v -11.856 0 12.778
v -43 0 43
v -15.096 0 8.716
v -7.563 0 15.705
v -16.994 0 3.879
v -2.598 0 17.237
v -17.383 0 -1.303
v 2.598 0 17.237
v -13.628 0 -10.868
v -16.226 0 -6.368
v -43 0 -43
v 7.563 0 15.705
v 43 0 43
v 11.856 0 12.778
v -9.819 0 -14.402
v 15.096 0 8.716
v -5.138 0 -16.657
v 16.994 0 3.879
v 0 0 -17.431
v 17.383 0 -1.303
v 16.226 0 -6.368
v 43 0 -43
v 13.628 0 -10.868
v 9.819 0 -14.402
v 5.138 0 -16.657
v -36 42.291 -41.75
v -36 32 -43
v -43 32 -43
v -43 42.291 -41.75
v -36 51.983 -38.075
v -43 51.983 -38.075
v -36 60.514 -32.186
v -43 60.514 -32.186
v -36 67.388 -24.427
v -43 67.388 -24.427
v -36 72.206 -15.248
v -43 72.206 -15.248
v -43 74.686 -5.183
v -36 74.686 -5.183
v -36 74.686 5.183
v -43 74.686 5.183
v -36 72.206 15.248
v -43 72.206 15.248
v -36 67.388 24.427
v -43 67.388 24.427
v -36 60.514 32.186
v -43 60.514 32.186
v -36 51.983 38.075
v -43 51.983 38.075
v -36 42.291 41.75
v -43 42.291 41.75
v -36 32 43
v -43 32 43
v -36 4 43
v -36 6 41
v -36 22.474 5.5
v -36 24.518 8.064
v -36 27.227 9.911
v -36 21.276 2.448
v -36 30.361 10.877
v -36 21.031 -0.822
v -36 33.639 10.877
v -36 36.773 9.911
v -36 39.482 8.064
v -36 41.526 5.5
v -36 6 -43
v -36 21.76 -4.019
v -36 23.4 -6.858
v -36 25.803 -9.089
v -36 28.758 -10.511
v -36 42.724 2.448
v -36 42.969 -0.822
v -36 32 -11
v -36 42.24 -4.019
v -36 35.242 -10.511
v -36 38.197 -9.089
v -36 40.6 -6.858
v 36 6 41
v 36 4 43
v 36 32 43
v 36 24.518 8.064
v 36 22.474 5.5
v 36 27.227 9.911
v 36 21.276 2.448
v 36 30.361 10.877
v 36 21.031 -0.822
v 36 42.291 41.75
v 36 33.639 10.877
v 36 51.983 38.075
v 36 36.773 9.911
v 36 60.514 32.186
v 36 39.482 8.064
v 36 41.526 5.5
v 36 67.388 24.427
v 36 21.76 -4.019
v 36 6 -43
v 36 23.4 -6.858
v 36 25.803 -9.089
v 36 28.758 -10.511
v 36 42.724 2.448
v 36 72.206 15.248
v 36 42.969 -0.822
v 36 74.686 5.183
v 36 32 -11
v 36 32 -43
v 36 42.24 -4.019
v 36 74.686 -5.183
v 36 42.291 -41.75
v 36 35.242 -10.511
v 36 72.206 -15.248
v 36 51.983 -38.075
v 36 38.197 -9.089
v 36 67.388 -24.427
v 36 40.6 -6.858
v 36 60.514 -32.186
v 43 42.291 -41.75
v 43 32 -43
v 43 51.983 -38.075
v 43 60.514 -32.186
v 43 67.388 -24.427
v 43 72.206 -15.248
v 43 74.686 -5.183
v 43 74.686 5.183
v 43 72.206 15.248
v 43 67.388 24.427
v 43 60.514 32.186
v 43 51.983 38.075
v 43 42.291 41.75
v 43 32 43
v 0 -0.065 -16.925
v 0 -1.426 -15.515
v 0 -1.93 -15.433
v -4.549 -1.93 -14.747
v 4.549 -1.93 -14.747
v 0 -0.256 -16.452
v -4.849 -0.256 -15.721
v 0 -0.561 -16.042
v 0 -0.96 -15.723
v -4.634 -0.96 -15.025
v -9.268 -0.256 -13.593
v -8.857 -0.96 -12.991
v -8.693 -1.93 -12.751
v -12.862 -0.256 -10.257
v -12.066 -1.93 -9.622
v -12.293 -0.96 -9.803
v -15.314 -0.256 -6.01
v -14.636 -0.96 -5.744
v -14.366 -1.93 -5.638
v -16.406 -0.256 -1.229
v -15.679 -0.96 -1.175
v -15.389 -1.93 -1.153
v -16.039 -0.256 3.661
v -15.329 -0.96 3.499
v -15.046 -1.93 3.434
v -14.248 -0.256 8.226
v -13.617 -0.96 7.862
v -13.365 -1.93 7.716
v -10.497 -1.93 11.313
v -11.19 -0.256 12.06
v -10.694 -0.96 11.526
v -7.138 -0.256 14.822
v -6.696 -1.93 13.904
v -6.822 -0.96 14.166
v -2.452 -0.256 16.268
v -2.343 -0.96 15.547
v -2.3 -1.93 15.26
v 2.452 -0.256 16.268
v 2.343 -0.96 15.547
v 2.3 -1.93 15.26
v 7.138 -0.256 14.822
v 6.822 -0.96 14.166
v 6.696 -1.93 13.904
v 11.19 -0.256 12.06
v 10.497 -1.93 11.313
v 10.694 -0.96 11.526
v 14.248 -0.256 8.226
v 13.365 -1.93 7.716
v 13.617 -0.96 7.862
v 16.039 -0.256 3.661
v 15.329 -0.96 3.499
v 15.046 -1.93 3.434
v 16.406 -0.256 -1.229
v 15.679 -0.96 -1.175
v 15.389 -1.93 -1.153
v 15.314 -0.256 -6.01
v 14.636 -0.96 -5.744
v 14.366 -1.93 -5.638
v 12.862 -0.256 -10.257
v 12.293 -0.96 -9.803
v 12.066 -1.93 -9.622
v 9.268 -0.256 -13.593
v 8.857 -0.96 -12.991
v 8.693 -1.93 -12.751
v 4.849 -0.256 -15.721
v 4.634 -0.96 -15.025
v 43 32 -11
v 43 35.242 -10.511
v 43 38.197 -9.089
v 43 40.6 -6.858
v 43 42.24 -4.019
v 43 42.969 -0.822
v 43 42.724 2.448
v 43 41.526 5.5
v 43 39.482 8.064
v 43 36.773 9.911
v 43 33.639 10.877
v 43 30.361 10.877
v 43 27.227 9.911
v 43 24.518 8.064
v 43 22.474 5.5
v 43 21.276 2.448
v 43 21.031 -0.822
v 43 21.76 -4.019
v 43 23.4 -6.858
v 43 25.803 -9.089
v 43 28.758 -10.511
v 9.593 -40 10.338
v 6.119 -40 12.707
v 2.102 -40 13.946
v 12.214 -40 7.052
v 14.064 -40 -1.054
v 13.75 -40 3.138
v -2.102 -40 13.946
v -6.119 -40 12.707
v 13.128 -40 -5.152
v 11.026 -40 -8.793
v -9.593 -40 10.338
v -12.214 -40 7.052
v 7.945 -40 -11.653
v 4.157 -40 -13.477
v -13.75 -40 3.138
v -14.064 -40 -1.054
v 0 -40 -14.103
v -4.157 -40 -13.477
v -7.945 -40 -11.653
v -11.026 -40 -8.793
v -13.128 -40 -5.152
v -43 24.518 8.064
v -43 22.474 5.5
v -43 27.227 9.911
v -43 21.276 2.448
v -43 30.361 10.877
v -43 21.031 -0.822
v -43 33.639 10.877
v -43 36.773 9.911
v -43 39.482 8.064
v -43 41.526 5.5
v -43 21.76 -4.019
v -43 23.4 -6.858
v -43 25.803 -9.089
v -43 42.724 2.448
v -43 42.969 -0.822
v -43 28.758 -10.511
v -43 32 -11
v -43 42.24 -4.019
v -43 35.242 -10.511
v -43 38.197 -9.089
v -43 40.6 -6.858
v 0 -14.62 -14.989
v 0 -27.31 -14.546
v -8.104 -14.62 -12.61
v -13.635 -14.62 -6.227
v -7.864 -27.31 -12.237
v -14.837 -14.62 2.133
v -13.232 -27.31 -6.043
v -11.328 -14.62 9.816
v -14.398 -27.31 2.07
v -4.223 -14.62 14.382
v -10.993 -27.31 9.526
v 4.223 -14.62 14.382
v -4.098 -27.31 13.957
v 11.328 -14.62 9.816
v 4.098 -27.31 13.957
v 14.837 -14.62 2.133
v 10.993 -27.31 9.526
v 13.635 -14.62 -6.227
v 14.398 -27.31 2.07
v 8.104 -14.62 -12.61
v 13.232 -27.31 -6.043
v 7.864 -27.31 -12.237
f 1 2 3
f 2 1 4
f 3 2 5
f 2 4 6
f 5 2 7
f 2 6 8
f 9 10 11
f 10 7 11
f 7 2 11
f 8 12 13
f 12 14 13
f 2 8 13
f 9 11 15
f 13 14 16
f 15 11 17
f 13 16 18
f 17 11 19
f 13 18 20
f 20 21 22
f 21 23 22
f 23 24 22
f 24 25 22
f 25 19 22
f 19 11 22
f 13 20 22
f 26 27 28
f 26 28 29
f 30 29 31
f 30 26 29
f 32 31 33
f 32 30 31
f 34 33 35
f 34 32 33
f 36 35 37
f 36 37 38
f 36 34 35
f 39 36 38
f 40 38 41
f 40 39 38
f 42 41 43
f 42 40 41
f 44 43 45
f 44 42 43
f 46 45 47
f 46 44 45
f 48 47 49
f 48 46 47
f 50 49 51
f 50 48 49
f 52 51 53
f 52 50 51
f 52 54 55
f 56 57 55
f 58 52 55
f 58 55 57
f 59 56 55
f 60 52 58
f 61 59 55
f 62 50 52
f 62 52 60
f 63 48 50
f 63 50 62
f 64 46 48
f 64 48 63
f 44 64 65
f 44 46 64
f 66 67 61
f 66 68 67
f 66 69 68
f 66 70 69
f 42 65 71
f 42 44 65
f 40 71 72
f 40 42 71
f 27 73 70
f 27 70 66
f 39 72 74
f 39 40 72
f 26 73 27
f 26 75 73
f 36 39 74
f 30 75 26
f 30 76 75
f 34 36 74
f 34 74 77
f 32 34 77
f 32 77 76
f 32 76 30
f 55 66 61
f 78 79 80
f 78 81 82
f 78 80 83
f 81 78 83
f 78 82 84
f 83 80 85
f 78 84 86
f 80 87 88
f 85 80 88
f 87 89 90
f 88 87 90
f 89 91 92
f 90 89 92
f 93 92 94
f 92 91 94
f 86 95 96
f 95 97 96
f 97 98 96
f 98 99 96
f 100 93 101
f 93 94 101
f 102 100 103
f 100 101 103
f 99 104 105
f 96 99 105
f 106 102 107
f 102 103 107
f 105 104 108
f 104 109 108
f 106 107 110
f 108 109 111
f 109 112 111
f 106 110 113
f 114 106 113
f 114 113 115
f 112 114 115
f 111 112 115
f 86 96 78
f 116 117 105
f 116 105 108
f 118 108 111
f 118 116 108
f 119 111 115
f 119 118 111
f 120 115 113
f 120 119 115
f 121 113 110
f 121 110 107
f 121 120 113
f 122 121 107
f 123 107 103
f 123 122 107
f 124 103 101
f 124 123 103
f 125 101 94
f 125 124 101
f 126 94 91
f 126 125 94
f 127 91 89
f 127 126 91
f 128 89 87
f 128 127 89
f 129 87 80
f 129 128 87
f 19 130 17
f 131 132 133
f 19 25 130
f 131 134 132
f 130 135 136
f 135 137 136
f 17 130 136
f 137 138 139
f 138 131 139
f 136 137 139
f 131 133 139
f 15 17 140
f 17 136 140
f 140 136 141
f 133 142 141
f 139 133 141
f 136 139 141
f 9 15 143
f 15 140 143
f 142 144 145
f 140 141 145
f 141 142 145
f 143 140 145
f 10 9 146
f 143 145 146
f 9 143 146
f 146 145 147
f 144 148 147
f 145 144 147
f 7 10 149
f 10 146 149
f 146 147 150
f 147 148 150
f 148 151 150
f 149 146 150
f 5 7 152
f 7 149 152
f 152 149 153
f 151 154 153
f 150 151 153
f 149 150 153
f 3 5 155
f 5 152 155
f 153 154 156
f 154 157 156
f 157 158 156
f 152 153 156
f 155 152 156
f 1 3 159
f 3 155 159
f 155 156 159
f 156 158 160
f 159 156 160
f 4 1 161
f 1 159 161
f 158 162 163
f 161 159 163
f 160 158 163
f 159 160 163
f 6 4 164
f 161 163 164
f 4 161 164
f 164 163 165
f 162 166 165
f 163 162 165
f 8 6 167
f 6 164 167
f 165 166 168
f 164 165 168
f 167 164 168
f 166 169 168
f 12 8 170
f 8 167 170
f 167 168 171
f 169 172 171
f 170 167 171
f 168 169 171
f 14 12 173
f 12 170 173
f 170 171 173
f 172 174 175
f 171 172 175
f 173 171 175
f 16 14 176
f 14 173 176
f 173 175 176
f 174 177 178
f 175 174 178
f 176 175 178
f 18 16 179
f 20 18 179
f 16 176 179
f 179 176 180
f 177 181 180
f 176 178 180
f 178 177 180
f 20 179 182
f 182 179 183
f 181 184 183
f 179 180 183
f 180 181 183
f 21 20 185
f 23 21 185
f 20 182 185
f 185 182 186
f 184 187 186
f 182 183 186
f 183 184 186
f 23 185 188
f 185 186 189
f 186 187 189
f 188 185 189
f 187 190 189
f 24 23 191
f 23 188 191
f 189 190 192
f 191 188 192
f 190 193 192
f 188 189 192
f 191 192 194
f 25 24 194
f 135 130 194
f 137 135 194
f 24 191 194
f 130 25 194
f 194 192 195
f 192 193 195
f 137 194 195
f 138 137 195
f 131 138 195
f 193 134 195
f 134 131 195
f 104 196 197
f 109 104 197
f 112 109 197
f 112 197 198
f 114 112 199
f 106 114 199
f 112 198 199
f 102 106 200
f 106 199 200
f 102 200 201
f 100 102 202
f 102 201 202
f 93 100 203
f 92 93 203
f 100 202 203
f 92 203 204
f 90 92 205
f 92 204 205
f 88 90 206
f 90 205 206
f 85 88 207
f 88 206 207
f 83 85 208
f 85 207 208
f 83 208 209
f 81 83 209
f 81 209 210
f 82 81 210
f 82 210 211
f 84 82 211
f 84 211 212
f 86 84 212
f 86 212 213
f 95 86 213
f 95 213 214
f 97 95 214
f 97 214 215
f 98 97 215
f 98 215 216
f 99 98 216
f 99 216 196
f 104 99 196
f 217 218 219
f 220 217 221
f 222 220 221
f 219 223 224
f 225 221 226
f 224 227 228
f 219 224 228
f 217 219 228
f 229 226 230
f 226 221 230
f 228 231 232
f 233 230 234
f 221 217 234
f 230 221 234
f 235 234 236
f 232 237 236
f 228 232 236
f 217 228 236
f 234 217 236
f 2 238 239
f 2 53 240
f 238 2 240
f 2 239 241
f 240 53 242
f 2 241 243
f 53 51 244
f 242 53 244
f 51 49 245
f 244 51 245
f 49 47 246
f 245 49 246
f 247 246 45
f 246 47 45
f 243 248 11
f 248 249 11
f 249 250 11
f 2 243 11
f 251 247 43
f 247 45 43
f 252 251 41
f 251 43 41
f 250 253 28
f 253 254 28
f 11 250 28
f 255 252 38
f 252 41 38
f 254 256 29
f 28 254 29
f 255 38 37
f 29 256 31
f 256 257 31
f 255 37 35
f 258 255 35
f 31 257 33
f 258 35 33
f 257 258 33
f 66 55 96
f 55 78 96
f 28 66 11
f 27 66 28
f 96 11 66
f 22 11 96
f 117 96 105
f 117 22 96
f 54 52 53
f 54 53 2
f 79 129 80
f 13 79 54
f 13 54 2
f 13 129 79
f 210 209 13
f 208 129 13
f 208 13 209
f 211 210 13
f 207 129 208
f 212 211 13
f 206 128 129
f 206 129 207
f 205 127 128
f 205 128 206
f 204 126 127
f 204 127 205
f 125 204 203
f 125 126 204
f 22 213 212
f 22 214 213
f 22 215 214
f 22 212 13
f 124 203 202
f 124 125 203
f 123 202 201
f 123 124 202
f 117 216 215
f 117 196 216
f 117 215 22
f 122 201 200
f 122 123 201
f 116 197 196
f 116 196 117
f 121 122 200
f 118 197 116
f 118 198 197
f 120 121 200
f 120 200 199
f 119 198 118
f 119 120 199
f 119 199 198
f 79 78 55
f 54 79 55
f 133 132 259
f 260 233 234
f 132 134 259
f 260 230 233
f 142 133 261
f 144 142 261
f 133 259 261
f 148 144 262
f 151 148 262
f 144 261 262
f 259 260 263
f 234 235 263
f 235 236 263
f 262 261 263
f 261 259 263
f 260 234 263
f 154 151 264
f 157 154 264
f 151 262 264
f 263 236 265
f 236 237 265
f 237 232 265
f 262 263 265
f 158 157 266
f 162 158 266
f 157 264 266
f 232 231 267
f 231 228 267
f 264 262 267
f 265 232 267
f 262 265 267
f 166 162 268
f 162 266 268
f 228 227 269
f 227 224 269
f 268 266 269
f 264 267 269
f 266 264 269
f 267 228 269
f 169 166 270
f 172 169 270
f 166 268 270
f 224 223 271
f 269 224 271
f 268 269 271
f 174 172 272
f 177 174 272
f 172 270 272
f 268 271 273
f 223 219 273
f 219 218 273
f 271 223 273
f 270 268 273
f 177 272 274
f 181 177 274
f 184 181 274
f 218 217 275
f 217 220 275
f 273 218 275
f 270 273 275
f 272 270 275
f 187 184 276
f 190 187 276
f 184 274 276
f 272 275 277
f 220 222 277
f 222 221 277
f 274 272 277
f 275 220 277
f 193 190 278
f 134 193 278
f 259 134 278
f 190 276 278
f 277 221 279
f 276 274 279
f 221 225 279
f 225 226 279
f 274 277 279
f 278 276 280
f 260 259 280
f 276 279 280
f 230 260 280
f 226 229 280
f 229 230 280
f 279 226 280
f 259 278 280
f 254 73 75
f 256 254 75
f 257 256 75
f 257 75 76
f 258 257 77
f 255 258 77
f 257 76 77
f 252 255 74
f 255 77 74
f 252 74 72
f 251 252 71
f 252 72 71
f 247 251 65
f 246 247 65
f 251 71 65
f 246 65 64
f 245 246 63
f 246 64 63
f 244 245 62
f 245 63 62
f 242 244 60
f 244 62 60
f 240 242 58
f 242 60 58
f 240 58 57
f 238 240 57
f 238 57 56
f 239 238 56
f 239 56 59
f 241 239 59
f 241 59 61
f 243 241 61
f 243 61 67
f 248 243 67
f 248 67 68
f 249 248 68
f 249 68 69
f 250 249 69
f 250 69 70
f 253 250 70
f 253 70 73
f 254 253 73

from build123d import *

# Parameters (mm, degrees)
SKETCH3_W           = 86
SKETCH3_H           = 86
BOSS_EXTRUDE1_DEPTH = 6
FILLET2_R           = 2
BOSS_EXTRUDE2_START = 43
SKETCH4_R           = 11
BOSS_EXTRUDE2_DEPTH = 86
SKETCH4_2_R         = 11
CUT_EXTRUDE1_DEPTH  = 36
CHAMFER2_SIZE       = 2


with BuildPart() as part:
    # Sketch2 → Revolve1 (revolve)
    with BuildSketch(Plane.XY, mode=Mode.PRIVATE) as revolve1_sk:
        Polygon((0, 0), (15.5, 0), (14.10316922, -40), (0, -40), align=None)
    revolve(revolve1_sk.sketch.rotate(Axis((0, -16.883928571, 0), (0, 1, 0)), 90), axis=Axis((0, -16.883928571, 0), (0, 1, 0)))

    # Sketch3 → Boss-Extrude1 (add)
    with BuildSketch(Plane(origin=(0, 0, 0), x_dir=(1, 0, 0), z_dir=(0, 1, 0))):
        Rectangle(SKETCH3_W, SKETCH3_H)
    extrude(amount=BOSS_EXTRUDE1_DEPTH)

    # Fillet2
    fillet2_edges = [part.edges().sort_by_distance(p)[0] for p in [
        (0, 0, 15.5),
    ]]
    fillet(fillet2_edges, radius=FILLET2_R)

    # Sketch4 → Boss-Extrude2 (add)
    with BuildSketch(Plane(origin=(0, 0, 0), x_dir=(0, 0, -1), z_dir=(1, 0, 0)).offset(BOSS_EXTRUDE2_START)):
        with BuildLine():
            Line((-43, 6), (43, 6))
            Line((43, 6), (43, 32))
            ThreePointArc((43, 32), (0, 75), (-43, 32))
            Line((-43, 32), (-43, 6))
        make_face()
        with Locations((0, 32)):
            Circle(SKETCH4_R, mode=Mode.SUBTRACT)
    extrude(amount=-BOSS_EXTRUDE2_DEPTH)

    # Sketch4<2> → Cut-Extrude1 (cut, symmetric)
    with BuildSketch(Plane(origin=(0, 0, 0), x_dir=(0, 0, -1), z_dir=(1, 0, 0))):
        with BuildLine():
            Line((-43, 6), (43, 6))
            Line((43, 6), (43, 32))
            ThreePointArc((43, 32), (0, 75), (-43, 32))
            Line((-43, 32), (-43, 6))
        make_face()
        with Locations((0, 32)):
            Circle(SKETCH4_2_R, mode=Mode.SUBTRACT)
    extrude(amount=CUT_EXTRUDE1_DEPTH, both=True, mode=Mode.SUBTRACT)

    # Chamfer2
    chamfer2_edges = [part.edges().sort_by_distance(p)[0] for p in [
        (0, 6, 43),
    ]]
    chamfer(chamfer2_edges, length=CHAMFER2_SIZE)


solid = part.part
